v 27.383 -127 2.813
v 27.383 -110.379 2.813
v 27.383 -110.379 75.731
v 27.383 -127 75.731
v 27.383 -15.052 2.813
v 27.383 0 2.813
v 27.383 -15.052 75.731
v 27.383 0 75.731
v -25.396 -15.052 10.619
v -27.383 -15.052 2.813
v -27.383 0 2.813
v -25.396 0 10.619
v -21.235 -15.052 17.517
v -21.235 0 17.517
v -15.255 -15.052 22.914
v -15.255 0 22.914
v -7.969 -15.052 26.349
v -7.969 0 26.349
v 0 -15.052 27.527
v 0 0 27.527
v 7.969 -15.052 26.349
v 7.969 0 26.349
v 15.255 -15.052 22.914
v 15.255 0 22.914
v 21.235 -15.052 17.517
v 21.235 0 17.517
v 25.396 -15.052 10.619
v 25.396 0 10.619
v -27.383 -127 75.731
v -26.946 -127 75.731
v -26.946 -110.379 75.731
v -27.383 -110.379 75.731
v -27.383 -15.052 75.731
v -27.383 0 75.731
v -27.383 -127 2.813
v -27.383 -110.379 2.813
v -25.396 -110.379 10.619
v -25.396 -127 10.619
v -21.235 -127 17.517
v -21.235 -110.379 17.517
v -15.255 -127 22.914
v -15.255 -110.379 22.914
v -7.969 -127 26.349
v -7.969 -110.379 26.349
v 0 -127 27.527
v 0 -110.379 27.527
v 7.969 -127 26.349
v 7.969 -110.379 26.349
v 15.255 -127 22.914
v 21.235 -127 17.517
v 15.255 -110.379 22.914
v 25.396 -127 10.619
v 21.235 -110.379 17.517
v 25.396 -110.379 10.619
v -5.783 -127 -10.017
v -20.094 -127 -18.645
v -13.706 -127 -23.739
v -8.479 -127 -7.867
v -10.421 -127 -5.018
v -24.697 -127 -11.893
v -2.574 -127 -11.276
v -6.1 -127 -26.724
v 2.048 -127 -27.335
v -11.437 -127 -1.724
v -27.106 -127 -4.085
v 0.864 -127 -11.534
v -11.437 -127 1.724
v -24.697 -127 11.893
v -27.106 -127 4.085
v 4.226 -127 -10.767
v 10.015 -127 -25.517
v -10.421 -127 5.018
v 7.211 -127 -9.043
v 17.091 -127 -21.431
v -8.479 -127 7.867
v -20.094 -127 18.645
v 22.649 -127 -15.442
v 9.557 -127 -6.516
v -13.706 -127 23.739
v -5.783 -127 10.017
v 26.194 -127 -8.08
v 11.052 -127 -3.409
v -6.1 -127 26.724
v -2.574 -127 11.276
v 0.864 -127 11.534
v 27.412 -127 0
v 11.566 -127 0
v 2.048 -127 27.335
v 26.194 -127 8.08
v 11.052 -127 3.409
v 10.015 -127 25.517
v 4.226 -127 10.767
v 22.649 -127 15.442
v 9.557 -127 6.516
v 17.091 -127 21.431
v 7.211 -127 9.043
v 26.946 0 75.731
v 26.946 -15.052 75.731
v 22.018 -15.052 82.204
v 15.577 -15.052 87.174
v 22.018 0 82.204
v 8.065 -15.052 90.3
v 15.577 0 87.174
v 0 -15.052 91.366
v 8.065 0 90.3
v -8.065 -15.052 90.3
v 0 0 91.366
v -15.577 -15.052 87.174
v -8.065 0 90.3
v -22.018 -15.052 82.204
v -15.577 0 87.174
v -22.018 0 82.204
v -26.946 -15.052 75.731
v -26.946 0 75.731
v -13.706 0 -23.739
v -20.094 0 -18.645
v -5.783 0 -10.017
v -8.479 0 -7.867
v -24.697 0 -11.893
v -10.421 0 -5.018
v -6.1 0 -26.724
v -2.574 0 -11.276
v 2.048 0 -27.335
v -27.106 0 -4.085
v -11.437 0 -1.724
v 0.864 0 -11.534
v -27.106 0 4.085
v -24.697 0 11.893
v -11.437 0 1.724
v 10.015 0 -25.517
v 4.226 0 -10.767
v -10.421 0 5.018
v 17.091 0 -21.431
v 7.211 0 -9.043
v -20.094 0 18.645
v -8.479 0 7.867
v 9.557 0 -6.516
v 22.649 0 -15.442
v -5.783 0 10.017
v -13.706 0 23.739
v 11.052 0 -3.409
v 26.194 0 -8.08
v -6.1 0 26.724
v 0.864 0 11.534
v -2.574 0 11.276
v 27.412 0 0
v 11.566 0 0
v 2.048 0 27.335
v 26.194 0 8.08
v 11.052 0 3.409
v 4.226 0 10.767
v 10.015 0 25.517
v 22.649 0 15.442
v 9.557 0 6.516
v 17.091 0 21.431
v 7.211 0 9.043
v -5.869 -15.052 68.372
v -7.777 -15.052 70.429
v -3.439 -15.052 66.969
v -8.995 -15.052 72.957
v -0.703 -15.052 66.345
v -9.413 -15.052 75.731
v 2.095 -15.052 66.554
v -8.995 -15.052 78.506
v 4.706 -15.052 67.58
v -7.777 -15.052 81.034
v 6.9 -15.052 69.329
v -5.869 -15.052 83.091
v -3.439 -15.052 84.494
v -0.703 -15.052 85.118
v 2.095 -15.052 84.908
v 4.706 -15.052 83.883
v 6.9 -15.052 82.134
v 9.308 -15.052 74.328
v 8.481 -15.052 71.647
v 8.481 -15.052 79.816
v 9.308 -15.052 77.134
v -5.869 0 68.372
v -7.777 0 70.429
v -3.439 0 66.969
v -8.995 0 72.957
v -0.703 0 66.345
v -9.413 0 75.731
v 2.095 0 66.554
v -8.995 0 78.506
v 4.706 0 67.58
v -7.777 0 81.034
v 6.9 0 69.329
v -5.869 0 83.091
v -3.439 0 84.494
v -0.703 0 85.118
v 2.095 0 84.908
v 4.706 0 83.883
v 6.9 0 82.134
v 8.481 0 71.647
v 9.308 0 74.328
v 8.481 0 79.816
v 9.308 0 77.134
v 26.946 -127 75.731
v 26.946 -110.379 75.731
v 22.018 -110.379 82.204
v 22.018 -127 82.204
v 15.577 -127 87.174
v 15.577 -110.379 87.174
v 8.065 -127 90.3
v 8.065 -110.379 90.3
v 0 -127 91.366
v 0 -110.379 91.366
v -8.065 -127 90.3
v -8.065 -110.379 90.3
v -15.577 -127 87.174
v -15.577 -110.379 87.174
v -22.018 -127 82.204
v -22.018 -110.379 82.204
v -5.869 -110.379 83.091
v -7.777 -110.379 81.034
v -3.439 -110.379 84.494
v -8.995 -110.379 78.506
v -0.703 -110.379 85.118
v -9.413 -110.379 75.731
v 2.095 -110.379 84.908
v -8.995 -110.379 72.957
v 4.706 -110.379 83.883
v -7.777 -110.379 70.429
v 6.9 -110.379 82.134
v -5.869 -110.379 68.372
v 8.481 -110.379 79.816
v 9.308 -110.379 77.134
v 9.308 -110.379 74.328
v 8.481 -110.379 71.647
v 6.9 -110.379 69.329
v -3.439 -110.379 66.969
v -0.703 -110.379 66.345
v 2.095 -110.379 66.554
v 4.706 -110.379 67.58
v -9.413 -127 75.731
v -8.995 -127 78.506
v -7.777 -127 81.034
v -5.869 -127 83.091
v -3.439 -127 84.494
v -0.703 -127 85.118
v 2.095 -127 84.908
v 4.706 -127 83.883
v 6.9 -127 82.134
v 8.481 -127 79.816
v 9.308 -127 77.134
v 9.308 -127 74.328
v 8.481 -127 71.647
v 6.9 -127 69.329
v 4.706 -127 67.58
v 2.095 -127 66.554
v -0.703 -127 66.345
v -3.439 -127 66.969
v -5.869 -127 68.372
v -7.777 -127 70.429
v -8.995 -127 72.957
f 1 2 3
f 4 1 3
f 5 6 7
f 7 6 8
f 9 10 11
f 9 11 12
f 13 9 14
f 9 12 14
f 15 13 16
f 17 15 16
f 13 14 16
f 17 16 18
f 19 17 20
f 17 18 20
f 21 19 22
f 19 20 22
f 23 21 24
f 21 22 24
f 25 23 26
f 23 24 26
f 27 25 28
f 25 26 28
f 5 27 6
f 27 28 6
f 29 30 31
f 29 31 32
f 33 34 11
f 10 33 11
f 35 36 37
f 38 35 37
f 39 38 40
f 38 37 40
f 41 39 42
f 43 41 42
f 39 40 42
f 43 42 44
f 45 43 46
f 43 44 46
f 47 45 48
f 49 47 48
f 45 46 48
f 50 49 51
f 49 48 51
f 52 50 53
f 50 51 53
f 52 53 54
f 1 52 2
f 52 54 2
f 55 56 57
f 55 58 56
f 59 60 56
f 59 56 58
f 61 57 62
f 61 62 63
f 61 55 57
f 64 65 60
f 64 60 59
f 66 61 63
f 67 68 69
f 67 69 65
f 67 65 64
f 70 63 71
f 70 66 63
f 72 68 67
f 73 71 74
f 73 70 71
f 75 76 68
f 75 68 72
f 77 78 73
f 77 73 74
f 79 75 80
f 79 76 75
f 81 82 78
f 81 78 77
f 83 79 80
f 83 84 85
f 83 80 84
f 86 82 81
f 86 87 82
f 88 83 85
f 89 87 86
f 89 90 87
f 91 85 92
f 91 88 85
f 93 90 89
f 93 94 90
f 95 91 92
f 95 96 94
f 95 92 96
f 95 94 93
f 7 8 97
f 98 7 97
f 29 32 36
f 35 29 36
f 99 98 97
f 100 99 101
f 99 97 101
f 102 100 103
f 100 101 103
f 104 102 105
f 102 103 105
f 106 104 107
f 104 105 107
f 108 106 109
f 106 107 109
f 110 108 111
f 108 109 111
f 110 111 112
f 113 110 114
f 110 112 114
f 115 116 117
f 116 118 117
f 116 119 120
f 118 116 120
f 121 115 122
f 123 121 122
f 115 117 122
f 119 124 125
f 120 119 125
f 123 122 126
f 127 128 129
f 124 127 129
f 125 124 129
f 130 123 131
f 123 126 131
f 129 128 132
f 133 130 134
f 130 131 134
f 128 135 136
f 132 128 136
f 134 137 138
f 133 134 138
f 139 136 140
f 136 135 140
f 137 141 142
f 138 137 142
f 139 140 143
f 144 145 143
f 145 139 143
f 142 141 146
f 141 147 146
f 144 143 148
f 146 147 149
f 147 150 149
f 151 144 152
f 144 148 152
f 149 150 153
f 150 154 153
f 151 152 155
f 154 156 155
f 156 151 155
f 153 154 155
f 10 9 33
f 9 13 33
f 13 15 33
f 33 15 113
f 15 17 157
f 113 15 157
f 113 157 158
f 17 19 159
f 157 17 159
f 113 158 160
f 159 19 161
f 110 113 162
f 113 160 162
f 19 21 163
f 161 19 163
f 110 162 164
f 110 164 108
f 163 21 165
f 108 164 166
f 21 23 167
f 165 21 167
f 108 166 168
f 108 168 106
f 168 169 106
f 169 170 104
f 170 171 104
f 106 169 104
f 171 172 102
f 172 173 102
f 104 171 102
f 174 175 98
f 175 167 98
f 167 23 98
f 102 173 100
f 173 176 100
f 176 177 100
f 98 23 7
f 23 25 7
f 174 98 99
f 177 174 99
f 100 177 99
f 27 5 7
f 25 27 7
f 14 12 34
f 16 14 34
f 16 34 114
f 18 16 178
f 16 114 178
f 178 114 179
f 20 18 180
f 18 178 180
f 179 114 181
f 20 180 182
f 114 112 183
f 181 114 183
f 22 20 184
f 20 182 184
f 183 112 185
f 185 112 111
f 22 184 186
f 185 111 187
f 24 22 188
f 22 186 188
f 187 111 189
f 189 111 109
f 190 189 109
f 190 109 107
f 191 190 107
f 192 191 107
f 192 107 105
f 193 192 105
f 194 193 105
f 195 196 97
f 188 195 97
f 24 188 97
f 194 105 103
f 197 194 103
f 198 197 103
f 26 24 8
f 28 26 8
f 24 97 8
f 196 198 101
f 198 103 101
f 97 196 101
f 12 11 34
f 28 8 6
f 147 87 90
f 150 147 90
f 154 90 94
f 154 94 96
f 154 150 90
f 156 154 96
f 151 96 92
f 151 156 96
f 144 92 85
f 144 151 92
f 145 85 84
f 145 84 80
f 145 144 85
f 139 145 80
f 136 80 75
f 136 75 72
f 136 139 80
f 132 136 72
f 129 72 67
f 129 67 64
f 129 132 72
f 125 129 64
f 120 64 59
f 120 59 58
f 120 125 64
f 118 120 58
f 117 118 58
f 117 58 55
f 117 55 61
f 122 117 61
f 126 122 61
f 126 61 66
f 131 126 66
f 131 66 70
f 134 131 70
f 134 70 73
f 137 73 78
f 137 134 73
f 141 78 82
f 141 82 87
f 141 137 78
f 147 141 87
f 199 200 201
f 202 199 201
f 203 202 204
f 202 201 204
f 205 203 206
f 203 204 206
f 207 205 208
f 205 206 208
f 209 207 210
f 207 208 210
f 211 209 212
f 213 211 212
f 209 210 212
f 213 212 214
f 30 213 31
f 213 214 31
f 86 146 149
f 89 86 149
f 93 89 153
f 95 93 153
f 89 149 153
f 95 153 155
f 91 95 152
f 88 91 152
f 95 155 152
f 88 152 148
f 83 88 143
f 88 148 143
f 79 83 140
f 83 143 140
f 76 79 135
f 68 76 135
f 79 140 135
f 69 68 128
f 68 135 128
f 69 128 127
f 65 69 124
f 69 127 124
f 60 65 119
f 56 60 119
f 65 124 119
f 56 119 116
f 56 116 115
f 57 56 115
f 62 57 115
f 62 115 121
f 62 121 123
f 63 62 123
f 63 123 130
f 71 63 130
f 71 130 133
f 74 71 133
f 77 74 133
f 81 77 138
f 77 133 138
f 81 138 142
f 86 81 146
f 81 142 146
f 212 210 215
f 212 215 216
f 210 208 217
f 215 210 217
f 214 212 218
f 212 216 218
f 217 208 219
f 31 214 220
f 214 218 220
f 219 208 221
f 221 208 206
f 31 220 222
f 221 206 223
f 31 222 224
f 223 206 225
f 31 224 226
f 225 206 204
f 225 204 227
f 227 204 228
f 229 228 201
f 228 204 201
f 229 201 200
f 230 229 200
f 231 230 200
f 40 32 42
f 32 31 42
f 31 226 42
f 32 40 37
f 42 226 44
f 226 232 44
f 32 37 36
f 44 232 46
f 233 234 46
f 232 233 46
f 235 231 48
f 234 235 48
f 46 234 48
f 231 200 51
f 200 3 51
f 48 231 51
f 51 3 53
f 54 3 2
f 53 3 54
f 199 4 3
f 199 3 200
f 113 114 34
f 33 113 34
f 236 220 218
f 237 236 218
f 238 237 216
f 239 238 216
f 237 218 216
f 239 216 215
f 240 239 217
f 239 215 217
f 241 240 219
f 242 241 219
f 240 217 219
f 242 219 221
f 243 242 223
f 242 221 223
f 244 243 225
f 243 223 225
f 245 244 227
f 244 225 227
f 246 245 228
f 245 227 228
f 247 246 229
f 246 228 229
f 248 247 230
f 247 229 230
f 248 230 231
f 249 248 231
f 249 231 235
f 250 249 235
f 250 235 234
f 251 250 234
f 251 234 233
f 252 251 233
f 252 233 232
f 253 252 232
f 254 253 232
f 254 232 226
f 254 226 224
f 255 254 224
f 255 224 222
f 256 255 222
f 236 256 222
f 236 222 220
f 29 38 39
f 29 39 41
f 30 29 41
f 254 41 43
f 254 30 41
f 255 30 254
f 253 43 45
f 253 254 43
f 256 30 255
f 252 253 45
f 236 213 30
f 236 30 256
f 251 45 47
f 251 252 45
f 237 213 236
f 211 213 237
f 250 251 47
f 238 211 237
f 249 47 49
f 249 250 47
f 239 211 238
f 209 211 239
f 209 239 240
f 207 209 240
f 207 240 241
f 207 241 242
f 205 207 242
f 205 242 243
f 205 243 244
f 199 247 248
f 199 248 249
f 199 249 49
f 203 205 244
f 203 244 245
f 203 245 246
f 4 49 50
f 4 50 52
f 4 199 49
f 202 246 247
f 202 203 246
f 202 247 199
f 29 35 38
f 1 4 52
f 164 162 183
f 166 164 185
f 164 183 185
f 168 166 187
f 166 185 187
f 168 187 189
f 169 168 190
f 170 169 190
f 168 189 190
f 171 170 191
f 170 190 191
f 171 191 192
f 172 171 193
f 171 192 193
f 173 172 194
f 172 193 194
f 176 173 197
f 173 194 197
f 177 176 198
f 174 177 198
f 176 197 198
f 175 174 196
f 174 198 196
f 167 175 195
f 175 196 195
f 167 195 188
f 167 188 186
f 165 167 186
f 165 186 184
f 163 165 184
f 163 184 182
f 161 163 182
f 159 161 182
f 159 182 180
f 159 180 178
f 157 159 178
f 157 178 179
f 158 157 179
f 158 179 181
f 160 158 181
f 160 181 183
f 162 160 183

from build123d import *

# Parameters (mm, degrees)
F0_R     = 27.4116856275
F0_R_2   = 11.5663237111
F1_DEPTH = 127
F3_DEPTH = 127
F4_W     = 95.3267142177
F4_H     = 18.8548341393
F4_H_2   = 72.9184712529
F5_DEPTH = 54.7957877316


# Not quite as in the source:
# - a feature of the source that left no trace in its solid (it failed there, or was rolled back) is left out


with BuildPart() as f1:
    # F0 (on Front) → F1 (new body)
    with BuildSketch(Plane.XZ):
        Circle(F0_R)
        Circle(F0_R_2, mode=Mode.SUBTRACT)
    extrude(amount=F1_DEPTH)


with BuildPart() as f3:
    # F2 (on Front) → F3 (new body)
    with BuildSketch(Plane.XZ):
        with BuildLine():
            Line((-26.9458102859, 75.7313892245), (-27.3831021041, 75.7313892245))
            Line((-27.3831021041, 75.7313892245), (-27.3831021041, 74.9398508998))
            ThreePointArc((-27.3831021041, 74.9398508998), (-27.1673390968, 75.3372127448), (-26.9458102859, 75.7313892245))
        make_face()
        with BuildLine():
            Line((-9.4129424542, 75.7313892245), (-26.9458102859, 75.7313892245))
            ThreePointArc((-26.9458102859, 75.7313892245), (-27.1673390968, 75.3372127448), (-27.3831021041, 74.9398508998))
            Line((-27.3831021041, 74.9398508998), (-27.3831021041, 2.8129179717))
            ThreePointArc((-27.3831021041, 2.8129179717), (0, 27.5272008813), (27.3831021041, 2.8129179717))
            Line((27.3831021041, 2.8129179717), (27.3831021041, 74.9398508998))
            ThreePointArc((27.3831021041, 74.9398508998), (27.1673390968, 75.3372127448), (26.9458102859, 75.7313892245))
            Line((26.9458102859, 75.7313892245), (9.4129424542, 75.7313892245))
            ThreePointArc((9.4129424542, 75.7313892245), (0, 66.3184467703), (-9.4129424542, 75.7313892245))
        make_face()
        with BuildLine():
            ThreePointArc((26.9458102859, 75.7313892245), (0, 91.3659351286), (-26.9458102859, 75.7313892245))
            Line((-26.9458102859, 75.7313892245), (-9.4129424542, 75.7313892245))
            ThreePointArc((-9.4129424542, 75.7313892245), (0, 85.1443316787), (9.4129424542, 75.7313892245))
            Line((9.4129424542, 75.7313892245), (26.9458102859, 75.7313892245))
        make_face()
        with BuildLine():
            Line((27.3831021041, 75.7313892245), (26.9458102859, 75.7313892245))
            ThreePointArc((26.9458102859, 75.7313892245), (27.1673390968, 75.3372127448), (27.3831021041, 74.9398508998))
            Line((27.3831021041, 74.9398508998), (27.3831021041, 75.7313892245))
        make_face()
    extrude(amount=F3_DEPTH)

    # F4 (on face) → F5 (cut, through all)
    with BuildSketch(Plane.YZ.offset(27.3831021041)):
        with Locations((-62.7153925598, 85.1588062942)):
            Rectangle(F4_W, F4_H)
        with Locations((-62.7153925598, 39.2721535981)):
            Rectangle(F4_W, F4_H_2)
    extrude(amount=-F5_DEPTH, mode=Mode.SUBTRACT)


solid = Compound([f1.part, f3.part])
